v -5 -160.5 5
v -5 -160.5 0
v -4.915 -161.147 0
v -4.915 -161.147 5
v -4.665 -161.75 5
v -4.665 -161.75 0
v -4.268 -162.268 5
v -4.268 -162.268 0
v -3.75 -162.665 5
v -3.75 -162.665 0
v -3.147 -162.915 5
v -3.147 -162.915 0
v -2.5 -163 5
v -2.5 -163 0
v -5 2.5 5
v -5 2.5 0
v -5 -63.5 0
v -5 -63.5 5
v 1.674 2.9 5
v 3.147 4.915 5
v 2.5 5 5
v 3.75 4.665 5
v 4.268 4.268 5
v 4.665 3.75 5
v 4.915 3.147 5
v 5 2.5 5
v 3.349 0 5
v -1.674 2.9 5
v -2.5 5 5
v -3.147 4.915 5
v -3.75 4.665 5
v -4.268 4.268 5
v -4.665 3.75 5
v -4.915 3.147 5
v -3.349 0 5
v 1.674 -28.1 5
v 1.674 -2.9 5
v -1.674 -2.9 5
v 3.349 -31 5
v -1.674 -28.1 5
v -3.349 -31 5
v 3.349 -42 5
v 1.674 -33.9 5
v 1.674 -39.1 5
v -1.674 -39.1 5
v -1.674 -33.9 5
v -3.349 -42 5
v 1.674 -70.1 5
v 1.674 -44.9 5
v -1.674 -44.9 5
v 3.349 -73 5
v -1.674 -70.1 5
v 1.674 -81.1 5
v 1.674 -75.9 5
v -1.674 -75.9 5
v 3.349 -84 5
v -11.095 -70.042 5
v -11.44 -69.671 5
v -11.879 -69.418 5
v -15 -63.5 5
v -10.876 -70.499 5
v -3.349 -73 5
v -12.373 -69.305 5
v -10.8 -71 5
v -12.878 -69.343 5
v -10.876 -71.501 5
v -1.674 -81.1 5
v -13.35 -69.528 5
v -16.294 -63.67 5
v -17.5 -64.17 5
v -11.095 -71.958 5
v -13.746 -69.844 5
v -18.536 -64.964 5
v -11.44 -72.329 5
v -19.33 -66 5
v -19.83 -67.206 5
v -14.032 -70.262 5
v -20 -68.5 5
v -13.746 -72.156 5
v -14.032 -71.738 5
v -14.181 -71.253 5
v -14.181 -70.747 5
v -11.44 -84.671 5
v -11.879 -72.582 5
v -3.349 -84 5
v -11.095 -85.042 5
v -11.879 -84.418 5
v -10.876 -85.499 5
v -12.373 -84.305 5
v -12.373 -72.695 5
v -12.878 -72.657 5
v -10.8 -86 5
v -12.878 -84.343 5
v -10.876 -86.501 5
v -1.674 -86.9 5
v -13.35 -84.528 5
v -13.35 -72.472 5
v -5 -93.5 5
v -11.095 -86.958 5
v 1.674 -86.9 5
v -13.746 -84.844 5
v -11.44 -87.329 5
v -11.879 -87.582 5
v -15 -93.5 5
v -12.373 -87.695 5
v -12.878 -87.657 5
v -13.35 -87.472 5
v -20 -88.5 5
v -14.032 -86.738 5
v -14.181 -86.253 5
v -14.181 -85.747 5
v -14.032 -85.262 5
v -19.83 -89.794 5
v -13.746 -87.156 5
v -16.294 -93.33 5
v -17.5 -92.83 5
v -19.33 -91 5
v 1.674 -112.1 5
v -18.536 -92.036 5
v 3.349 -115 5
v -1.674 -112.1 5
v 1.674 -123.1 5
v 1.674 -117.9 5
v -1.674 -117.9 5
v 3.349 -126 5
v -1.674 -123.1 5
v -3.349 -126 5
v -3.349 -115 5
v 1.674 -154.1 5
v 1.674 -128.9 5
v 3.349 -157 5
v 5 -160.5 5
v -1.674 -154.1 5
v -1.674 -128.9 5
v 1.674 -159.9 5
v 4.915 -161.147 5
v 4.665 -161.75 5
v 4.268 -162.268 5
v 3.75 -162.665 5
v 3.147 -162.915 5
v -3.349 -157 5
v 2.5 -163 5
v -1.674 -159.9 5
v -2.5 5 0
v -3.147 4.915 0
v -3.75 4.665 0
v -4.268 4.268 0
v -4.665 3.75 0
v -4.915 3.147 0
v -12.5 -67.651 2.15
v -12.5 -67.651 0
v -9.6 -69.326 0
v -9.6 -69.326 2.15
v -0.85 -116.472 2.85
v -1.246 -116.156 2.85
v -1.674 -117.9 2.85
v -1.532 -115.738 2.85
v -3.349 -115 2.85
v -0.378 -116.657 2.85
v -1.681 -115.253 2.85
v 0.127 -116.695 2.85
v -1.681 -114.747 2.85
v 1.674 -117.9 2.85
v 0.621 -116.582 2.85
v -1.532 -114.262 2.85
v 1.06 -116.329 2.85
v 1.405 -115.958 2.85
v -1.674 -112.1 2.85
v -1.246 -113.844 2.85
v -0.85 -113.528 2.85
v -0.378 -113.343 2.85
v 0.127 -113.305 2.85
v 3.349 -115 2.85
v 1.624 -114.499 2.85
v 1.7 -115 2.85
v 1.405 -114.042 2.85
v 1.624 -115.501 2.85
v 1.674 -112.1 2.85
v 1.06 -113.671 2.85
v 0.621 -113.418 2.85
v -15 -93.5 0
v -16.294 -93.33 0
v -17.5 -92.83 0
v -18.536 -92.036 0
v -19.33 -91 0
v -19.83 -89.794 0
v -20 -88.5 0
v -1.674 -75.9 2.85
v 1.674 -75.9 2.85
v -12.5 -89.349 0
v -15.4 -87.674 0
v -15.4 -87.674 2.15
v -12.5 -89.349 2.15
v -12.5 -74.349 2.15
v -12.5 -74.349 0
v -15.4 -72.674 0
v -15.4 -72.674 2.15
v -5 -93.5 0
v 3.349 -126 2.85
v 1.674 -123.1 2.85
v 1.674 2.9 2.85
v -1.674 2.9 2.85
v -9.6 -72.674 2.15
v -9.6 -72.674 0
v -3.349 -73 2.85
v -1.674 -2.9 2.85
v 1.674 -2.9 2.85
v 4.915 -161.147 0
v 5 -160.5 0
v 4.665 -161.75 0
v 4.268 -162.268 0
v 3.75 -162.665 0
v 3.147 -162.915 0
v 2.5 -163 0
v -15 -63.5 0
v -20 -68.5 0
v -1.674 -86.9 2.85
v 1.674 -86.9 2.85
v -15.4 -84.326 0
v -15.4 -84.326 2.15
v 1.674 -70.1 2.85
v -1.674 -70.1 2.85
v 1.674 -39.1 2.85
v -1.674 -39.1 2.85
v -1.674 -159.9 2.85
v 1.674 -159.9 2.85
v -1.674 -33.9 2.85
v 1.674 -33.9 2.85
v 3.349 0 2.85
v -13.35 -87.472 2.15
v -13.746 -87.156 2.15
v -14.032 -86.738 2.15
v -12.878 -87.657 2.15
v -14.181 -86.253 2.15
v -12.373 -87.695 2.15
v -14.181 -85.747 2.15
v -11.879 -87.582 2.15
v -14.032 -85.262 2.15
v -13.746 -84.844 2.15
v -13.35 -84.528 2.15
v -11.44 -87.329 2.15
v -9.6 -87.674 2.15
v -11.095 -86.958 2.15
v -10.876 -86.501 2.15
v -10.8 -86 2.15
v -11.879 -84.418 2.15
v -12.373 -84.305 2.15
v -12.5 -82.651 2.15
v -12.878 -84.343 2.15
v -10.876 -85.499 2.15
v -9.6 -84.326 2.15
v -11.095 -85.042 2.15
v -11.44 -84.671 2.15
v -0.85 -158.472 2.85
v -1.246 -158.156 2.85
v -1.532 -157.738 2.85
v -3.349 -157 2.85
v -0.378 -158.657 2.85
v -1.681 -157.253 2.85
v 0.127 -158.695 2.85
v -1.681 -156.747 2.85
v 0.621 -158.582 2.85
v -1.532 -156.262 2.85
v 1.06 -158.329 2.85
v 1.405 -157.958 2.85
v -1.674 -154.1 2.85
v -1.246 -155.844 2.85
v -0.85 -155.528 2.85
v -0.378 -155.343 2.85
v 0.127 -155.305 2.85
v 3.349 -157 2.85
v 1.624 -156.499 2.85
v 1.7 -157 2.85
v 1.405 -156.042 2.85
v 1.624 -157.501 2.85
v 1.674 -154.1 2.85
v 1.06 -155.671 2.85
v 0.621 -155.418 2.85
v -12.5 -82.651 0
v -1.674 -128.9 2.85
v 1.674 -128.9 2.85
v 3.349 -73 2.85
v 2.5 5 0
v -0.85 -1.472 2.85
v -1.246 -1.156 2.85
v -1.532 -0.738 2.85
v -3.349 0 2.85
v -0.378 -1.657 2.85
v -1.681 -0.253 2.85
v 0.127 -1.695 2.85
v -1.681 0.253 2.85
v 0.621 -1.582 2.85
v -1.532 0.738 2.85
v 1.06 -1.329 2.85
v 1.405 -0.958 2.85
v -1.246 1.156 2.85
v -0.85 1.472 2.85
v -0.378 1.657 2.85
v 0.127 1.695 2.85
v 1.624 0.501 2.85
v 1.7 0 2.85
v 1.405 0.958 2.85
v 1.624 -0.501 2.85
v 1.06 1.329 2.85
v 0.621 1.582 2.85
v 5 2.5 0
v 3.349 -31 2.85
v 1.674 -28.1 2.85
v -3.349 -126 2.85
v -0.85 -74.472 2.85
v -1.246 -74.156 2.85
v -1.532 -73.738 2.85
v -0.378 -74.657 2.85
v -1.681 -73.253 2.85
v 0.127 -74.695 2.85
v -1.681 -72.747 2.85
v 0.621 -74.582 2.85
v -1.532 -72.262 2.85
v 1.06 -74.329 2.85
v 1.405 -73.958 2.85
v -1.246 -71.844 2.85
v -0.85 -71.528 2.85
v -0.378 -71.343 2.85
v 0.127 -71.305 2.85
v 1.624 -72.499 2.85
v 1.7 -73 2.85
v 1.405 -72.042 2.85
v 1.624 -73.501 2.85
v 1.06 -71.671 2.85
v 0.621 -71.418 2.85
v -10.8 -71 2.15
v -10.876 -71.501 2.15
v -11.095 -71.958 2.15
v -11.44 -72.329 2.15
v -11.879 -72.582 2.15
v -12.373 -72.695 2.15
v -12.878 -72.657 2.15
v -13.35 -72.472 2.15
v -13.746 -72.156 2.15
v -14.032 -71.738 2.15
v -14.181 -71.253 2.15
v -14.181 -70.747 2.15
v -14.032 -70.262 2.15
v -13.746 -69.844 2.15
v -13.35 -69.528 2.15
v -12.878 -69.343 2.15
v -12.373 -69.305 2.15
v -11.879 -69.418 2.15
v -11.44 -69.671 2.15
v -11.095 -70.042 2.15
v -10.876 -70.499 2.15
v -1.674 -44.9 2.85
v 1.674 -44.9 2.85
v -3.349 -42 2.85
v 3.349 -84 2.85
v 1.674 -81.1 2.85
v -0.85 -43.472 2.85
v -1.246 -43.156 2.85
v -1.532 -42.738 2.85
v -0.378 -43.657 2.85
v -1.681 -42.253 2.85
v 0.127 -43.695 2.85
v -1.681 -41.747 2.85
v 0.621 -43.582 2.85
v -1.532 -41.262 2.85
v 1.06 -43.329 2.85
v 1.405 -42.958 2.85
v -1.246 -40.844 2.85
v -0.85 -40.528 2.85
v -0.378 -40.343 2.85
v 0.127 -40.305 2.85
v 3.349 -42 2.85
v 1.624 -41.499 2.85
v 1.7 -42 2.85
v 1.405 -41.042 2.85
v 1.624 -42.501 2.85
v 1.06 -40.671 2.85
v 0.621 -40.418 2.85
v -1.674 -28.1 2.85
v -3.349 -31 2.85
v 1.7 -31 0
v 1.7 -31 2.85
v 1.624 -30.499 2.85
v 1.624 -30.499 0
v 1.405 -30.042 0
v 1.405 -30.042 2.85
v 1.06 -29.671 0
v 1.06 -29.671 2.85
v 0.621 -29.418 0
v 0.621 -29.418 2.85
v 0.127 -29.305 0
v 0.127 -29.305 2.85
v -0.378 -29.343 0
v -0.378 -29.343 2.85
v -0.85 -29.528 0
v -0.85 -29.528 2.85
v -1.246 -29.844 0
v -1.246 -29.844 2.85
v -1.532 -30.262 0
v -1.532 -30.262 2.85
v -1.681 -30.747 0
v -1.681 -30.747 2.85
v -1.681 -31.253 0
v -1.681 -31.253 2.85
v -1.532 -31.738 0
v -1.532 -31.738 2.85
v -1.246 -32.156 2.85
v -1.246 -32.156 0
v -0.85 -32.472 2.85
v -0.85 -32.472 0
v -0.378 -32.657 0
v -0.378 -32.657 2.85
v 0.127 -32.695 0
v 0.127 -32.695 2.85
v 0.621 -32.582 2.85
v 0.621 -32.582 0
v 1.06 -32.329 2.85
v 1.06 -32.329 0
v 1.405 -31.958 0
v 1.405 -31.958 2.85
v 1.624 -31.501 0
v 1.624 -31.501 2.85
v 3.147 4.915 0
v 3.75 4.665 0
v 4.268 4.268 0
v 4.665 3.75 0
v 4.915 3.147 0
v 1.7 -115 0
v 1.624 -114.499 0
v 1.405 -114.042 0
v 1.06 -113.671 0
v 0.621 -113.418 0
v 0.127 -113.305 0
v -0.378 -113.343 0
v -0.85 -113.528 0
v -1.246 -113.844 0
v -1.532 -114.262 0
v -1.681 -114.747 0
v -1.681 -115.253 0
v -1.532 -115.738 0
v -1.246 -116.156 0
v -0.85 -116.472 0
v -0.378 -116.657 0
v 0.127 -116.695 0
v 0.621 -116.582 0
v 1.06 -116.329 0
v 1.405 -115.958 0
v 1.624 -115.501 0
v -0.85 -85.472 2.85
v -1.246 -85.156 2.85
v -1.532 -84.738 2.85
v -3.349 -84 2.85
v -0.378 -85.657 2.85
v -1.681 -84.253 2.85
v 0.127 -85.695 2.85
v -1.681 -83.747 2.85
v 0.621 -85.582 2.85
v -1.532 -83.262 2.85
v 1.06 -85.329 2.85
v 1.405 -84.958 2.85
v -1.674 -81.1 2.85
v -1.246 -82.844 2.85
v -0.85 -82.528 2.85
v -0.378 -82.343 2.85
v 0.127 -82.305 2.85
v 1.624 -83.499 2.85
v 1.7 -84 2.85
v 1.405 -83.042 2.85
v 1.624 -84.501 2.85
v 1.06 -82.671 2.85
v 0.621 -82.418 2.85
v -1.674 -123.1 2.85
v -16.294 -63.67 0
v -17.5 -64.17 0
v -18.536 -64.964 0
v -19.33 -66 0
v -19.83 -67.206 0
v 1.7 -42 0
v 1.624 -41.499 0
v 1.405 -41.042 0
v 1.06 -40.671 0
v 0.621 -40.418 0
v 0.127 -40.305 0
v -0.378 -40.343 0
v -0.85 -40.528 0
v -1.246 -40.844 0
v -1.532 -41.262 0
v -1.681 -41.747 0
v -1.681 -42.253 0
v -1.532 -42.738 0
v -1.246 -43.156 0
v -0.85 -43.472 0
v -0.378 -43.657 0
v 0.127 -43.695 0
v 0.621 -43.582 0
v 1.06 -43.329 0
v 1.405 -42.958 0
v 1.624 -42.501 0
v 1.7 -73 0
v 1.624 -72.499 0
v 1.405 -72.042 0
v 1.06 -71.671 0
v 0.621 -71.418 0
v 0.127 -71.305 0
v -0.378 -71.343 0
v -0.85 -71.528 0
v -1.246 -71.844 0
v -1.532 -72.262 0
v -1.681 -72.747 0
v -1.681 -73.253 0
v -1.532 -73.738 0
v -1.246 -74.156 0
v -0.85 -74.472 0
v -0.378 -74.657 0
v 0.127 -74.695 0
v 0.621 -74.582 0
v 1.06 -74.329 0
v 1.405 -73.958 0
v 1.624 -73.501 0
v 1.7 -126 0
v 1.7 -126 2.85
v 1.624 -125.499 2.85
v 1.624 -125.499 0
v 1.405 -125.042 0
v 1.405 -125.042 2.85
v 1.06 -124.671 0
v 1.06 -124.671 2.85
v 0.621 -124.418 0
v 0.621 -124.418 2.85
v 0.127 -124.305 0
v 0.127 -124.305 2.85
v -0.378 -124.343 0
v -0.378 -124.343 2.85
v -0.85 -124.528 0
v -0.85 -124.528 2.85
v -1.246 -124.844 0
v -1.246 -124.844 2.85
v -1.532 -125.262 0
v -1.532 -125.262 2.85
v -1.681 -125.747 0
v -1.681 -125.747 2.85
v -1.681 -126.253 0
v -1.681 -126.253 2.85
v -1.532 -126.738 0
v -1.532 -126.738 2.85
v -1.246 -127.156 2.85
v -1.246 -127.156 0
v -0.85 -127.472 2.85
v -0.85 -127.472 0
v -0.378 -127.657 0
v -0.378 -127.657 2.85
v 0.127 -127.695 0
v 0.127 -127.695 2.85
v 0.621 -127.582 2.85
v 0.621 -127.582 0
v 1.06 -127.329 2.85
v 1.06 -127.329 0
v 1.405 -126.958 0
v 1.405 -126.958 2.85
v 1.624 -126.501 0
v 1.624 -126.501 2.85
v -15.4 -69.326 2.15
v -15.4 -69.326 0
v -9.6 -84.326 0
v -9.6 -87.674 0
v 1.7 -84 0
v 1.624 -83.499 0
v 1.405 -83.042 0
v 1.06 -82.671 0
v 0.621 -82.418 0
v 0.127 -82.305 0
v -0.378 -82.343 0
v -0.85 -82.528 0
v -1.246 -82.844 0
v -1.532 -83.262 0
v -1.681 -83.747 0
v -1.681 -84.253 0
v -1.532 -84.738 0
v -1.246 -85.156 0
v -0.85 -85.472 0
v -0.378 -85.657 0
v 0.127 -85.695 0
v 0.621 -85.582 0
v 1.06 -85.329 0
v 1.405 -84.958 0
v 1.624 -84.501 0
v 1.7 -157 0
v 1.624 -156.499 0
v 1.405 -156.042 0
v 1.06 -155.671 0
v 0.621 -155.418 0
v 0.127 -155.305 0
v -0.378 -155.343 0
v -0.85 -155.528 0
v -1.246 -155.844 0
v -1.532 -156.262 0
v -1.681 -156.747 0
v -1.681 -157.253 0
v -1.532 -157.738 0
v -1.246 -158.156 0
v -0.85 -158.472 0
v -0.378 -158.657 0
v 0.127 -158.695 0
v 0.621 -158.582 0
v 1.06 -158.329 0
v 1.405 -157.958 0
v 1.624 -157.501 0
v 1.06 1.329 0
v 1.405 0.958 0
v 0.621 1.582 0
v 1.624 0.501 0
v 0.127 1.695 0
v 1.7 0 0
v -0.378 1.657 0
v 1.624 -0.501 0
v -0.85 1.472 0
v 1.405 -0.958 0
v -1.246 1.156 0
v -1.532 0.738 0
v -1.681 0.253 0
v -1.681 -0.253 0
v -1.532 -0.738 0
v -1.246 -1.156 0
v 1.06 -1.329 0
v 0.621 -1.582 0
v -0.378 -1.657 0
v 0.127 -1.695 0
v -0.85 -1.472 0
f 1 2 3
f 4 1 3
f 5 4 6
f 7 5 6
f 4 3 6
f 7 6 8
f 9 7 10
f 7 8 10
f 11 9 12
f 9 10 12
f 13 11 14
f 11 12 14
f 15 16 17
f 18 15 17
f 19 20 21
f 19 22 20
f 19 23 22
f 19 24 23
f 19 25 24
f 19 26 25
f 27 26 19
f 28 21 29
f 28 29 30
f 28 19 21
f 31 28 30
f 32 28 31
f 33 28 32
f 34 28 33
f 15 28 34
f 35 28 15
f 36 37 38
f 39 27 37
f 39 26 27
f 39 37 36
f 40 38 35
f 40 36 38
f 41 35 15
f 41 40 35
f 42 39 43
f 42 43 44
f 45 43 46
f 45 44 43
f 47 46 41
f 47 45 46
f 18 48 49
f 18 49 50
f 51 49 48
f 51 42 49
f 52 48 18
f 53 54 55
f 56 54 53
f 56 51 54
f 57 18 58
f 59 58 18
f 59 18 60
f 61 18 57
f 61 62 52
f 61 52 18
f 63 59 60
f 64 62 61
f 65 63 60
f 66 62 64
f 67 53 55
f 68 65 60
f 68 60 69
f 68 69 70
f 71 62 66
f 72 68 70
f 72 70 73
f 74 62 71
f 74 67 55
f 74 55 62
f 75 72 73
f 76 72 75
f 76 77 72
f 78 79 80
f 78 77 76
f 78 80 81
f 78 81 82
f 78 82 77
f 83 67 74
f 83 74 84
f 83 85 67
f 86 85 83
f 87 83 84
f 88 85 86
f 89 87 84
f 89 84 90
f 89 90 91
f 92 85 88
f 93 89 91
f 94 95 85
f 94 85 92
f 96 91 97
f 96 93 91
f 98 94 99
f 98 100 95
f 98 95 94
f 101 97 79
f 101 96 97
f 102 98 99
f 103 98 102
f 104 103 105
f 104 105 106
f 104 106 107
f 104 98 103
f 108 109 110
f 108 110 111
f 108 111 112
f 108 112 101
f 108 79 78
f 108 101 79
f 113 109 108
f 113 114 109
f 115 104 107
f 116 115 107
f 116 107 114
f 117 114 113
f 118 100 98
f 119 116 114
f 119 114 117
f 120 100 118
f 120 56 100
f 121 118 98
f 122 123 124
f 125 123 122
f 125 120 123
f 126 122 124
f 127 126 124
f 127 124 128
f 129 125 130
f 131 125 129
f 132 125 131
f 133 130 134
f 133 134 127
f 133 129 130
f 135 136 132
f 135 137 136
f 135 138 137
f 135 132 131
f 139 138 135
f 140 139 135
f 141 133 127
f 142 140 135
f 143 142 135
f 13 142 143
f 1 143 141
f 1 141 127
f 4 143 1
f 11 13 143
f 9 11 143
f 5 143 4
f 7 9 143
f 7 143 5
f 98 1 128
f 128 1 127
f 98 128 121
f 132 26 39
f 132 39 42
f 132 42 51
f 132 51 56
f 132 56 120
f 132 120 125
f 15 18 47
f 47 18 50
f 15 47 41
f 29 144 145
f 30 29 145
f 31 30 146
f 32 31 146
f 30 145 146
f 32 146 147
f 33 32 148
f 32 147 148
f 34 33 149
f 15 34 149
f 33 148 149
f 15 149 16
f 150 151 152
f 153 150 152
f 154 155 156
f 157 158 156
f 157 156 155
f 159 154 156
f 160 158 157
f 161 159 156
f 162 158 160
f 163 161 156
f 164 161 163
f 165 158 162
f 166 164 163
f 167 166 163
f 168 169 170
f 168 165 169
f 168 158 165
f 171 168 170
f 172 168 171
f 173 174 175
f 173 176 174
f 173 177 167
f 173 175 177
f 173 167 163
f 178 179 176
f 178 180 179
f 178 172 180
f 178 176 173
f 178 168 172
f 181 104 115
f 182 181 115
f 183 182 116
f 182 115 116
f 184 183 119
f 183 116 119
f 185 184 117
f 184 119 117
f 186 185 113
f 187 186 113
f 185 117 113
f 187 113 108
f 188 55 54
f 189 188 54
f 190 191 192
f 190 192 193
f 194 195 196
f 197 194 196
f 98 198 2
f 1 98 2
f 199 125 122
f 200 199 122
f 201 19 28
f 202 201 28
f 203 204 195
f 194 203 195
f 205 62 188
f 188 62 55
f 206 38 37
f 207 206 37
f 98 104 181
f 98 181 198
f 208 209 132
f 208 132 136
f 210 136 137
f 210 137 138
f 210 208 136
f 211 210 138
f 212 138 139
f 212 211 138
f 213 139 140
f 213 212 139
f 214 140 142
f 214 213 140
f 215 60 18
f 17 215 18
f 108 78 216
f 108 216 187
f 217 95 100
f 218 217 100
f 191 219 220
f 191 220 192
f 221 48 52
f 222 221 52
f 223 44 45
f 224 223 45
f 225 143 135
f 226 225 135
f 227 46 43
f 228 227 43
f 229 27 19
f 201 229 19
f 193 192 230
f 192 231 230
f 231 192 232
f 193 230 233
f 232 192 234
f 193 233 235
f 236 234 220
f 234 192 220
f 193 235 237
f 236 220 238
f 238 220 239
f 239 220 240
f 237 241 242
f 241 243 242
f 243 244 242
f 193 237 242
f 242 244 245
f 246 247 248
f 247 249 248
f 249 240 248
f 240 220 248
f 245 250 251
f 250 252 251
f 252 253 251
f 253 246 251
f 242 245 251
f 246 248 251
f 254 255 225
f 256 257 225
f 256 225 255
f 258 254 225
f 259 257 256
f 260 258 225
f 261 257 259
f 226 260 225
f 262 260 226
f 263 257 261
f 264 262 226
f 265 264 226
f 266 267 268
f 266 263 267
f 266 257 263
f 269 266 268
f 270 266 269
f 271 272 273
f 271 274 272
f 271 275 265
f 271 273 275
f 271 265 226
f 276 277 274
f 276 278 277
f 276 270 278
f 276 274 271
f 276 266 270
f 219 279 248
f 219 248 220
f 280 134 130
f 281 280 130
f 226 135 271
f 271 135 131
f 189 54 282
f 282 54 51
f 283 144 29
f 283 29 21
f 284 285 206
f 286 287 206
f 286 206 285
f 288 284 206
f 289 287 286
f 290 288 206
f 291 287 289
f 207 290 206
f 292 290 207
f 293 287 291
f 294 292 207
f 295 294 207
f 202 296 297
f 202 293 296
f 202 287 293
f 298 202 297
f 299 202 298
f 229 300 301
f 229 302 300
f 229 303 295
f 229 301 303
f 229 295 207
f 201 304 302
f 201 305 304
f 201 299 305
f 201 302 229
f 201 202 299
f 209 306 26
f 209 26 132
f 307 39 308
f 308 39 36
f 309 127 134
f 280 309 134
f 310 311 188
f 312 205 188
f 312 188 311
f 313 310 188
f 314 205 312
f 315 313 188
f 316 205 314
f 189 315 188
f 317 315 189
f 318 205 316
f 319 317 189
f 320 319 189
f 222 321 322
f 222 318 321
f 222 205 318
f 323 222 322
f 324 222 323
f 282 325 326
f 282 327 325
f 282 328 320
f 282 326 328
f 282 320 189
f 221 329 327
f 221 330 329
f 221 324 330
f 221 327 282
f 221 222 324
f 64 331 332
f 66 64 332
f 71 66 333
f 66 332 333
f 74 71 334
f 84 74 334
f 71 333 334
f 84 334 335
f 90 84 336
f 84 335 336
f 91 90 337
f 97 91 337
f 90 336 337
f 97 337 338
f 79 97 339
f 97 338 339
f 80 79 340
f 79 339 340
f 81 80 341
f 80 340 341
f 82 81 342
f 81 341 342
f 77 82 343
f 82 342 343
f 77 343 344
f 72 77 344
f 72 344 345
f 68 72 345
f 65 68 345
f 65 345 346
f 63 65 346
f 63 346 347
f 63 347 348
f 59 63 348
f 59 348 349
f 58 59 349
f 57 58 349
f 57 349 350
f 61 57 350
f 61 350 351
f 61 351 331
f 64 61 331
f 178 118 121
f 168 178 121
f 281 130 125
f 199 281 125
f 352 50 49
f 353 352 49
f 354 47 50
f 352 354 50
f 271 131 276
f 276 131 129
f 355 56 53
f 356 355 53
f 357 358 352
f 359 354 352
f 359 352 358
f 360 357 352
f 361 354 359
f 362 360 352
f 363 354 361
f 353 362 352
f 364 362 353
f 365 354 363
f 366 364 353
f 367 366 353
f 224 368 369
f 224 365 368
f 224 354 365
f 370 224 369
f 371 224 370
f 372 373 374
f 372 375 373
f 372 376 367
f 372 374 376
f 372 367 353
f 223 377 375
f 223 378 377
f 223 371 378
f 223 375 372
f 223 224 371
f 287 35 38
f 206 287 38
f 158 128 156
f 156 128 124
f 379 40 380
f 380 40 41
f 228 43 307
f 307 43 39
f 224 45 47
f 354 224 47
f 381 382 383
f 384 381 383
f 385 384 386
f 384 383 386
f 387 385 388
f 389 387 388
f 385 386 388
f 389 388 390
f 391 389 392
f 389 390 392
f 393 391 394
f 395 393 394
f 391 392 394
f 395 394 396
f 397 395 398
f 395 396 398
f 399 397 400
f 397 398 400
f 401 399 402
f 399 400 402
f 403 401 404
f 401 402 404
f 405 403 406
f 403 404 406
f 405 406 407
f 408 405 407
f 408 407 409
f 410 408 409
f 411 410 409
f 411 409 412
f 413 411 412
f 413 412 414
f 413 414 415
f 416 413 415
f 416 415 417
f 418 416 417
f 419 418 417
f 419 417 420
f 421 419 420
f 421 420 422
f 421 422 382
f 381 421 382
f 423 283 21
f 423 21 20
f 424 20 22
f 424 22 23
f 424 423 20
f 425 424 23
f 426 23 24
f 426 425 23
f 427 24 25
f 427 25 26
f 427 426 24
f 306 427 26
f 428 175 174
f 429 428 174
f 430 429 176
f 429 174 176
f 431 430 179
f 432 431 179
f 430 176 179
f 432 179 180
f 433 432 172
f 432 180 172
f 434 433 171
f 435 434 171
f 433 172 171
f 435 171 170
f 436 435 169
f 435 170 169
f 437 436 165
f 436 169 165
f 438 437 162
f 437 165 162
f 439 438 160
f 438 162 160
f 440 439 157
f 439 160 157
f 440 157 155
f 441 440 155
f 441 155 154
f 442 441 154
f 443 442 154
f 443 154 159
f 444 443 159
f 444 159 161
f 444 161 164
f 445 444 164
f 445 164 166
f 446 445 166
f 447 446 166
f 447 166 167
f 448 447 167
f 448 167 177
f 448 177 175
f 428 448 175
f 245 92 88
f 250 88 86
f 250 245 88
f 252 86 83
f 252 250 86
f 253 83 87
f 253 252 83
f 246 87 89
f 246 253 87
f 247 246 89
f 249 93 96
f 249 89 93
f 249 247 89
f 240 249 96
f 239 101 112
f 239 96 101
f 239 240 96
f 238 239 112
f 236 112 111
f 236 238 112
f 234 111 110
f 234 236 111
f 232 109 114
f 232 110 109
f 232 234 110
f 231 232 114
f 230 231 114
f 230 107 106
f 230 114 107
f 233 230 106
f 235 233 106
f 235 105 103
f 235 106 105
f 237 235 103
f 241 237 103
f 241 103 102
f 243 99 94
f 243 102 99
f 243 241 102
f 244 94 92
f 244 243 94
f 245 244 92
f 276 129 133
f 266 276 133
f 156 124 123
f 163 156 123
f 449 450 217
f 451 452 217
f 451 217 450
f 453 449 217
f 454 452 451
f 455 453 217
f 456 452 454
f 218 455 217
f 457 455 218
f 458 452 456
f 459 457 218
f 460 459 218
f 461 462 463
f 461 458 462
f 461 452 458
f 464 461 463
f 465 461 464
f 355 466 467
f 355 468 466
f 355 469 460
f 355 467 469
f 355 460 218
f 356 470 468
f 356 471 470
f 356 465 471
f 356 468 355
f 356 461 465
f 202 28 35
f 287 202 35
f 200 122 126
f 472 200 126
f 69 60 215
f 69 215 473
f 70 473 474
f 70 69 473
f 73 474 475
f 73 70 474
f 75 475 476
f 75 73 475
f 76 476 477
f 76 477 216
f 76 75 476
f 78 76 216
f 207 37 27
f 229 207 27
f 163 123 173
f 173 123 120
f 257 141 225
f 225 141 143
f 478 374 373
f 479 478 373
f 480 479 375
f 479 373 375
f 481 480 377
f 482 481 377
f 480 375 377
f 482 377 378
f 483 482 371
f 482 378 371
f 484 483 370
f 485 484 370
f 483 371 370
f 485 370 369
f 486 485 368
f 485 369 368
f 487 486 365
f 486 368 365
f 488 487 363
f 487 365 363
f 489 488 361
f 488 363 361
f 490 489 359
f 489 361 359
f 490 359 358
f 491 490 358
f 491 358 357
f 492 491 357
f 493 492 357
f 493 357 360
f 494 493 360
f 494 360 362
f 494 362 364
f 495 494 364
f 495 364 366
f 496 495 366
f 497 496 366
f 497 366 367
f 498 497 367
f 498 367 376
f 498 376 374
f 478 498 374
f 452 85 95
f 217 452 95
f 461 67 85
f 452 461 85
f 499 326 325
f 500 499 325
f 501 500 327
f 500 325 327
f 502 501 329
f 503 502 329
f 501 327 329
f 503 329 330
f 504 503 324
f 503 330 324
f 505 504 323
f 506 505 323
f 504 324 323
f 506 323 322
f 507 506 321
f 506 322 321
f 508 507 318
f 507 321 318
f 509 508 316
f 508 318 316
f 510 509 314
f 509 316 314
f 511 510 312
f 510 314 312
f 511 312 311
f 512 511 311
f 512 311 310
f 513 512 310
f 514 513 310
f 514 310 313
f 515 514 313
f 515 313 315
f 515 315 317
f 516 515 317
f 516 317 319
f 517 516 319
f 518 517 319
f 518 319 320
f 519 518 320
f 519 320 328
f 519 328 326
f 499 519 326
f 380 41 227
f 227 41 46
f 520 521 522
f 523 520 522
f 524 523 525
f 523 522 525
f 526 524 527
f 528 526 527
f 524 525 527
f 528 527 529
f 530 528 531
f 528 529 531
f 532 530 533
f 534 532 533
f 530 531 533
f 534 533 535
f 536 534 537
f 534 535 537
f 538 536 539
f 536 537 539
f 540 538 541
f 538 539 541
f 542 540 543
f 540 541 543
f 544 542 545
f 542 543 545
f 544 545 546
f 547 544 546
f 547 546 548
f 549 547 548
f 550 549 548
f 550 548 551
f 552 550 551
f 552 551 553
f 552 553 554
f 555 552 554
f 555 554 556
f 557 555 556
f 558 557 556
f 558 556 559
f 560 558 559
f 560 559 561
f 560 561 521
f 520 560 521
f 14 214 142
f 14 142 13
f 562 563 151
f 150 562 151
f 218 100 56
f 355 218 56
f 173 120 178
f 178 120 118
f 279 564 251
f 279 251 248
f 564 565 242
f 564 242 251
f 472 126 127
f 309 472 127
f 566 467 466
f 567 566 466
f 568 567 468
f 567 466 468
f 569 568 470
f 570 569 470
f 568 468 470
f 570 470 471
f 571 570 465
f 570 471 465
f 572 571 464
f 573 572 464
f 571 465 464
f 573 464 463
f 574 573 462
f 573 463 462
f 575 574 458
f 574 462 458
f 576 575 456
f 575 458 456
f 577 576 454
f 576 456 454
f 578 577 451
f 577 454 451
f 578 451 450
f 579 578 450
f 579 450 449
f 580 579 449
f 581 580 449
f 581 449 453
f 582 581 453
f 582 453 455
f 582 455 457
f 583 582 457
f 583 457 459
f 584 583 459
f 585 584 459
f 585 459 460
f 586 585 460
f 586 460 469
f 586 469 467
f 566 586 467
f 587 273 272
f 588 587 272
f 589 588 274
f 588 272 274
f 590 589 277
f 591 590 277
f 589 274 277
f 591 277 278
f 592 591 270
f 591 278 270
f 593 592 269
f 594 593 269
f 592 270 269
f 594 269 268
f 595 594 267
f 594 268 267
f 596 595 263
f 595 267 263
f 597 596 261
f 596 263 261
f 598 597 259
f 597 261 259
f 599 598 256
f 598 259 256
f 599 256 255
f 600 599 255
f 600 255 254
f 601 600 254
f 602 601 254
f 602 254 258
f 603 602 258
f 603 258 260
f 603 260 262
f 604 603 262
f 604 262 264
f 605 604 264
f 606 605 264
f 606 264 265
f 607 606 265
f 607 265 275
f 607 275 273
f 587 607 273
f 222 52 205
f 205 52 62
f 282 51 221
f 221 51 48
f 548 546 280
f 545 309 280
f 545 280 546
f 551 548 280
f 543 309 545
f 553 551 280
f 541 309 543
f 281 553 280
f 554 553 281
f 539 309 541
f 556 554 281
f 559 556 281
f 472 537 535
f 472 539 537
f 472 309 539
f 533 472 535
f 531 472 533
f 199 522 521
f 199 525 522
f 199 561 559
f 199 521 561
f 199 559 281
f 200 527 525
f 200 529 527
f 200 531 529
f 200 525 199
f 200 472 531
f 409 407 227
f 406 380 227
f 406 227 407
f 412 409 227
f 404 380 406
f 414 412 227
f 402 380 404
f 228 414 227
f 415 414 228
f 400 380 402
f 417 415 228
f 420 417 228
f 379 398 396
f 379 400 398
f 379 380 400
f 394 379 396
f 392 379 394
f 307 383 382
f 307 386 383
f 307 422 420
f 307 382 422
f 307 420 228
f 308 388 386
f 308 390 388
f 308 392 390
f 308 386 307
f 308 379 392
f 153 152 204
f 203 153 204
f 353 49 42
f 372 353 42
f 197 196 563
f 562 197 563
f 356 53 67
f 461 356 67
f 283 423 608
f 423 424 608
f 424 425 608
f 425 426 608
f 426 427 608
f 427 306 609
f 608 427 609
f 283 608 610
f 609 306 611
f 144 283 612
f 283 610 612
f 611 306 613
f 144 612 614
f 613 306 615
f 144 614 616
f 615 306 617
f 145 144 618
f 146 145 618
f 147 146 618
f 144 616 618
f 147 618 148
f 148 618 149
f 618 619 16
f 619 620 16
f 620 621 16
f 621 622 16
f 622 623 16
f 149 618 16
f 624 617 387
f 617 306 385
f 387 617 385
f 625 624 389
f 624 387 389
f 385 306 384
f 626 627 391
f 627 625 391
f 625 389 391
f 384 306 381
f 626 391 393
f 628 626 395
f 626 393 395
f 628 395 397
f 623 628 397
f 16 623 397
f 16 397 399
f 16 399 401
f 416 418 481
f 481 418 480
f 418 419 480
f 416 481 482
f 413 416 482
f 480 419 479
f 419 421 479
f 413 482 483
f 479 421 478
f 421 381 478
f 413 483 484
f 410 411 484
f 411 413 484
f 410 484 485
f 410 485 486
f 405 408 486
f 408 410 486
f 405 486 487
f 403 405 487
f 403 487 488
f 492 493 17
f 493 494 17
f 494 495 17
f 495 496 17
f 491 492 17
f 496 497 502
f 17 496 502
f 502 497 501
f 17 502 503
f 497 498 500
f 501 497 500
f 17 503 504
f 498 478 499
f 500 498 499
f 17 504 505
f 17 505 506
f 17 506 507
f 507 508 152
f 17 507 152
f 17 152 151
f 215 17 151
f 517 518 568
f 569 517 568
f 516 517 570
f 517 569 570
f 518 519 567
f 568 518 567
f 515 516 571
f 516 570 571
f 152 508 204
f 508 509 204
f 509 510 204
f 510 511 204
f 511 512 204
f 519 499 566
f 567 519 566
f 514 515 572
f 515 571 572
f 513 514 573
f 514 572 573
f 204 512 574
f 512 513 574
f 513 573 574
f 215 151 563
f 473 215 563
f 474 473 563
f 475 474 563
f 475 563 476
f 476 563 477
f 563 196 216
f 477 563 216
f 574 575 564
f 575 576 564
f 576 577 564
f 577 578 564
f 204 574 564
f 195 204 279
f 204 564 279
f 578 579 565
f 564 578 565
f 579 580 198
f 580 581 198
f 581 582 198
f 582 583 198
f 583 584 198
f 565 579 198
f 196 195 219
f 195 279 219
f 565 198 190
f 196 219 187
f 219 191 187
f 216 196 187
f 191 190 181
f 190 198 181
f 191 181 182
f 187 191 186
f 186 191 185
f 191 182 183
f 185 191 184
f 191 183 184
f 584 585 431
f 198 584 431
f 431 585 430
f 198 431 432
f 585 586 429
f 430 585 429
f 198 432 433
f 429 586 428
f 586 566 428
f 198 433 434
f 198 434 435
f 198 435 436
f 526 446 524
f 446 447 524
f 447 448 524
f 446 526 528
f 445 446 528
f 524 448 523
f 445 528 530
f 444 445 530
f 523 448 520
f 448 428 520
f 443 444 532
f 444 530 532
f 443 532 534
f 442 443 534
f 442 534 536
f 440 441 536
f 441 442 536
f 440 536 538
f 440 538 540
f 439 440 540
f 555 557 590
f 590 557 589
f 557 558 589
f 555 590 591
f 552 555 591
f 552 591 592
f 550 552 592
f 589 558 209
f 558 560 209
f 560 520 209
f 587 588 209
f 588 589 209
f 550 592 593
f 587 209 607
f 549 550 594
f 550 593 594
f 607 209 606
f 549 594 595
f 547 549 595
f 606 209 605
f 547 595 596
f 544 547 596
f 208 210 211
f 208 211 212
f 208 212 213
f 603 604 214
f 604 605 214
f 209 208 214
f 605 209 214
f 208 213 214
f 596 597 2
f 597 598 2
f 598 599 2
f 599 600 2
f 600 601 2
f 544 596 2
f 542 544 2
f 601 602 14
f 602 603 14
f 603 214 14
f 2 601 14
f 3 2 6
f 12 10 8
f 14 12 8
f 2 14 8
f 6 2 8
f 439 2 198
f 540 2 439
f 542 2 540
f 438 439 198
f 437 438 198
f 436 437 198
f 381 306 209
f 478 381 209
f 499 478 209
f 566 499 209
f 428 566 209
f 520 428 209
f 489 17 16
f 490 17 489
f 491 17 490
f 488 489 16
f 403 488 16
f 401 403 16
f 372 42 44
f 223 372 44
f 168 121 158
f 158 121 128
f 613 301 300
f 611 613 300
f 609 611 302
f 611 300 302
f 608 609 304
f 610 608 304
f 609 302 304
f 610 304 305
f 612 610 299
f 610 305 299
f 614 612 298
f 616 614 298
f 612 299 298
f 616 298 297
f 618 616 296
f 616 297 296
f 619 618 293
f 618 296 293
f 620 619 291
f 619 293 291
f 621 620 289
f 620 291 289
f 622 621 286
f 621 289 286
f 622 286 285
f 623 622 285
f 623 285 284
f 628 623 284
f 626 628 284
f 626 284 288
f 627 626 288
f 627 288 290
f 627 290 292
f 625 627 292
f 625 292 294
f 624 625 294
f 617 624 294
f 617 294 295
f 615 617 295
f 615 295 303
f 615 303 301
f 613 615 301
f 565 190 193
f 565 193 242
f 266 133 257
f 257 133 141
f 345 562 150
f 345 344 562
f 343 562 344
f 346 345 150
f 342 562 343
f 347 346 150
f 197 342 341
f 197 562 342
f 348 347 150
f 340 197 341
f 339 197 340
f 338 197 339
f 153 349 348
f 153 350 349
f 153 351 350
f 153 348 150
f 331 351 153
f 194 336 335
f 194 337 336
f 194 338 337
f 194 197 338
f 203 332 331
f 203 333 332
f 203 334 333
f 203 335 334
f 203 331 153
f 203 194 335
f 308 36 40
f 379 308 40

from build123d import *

# Parameters (mm, degrees)
PAD_DEPTH                    = 5
POCKET_DEPTH                 = 2.15
SKETCH002_R                  = 1.7
HOLE_DEPTH                   = 339.594226
POCKET_LINEARPATTERN_2_DEPTH = 2.15
SKETCH002_LINEARPATTERN_2_R  = 1.7
HOLE_LINEARPATTERN_2_DEPTH   = 339.594226
LINEARPATTERN001_COUNT       = 4
LINEARPATTERN001_PITCH       = 42
PAD001_DEPTH                 = 5
POCKET001_DEPTH              = 2.15
SKETCH005_R                  = 1.7
HOLE001_DEPTH                = 342.698024


with BuildPart() as part:
    # Sketch → Pad (new body)
    with BuildSketch(Plane.XY):
        with BuildLine():
            Line((0, 5), (-2.5, 5))
            ThreePointArc((-2.5, 5), (-4.267767, 4.267767), (-5, 2.5))
            Line((-5, 2.5), (-5, -160.5))
            ThreePointArc((-5, -160.5), (-4.267767, -162.267767), (-2.5, -163))
            Line((-2.5, -163), (0, -163))
            Line((0, -163), (0, 5))
        make_face()
    pad = extrude(amount=PAD_DEPTH)

    # Mirrored: Pad across Sketch V_Axis
    add(pad.mirror(Plane(origin=(0, 0, 0), x_dir=(0, 0, 1), z_dir=(1, 0, 0))))

    # Sketch001 (on Face5 of Mirrored) → Pocket (cut)
    with BuildSketch(Plane.XY.offset(5)):
        Polygon((3.348632, 0), (1.674316, 2.9), (-1.674316, 2.9), (-3.348632, 0), (-1.674316, -2.9), (1.674316, -2.9), align=None)
    pocket = extrude(amount=-POCKET_DEPTH, mode=Mode.SUBTRACT)

    # Sketch002 (on Face21 of Pocket) → Hole (cut, through all)
    with BuildSketch(Plane.XY.offset(2.85)):
        Circle(SKETCH002_R)
    hole = extrude(amount=-HOLE_DEPTH, mode=Mode.SUBTRACT)

    # Sketch001 LinearPattern 2 → Pocket LinearPattern 2 (cut)
    with BuildSketch(Plane(origin=(0, -31, 5), x_dir=(1, 0, 0), z_dir=(0, 0, 1))):
        Polygon((3.348632, 0), (1.674316, 2.9), (-1.674316, 2.9), (-3.348632, 0), (-1.674316, -2.9), (1.674316, -2.9), align=None)
    pocket_linearpattern_2 = extrude(amount=-POCKET_LINEARPATTERN_2_DEPTH, mode=Mode.SUBTRACT)

    # Sketch002 LinearPattern 2 → Hole LinearPattern 2 (cut, through all)
    with BuildSketch(Plane(origin=(0, -31, 2.85), x_dir=(1, 0, 0), z_dir=(0, 0, 1))):
        Circle(SKETCH002_LINEARPATTERN_2_R)
    hole_linearpattern_2 = extrude(amount=-HOLE_LINEARPATTERN_2_DEPTH, mode=Mode.SUBTRACT)

    # LinearPattern001: Pocket, Hole, Pocket LinearPattern 2, Hole LinearPattern 2 ×4
    with Locations(*[(0, -i * LINEARPATTERN001_PITCH, 0) for i in range(1, LINEARPATTERN001_COUNT)]):
        add(pocket, mode=Mode.SUBTRACT)
        add(hole, mode=Mode.SUBTRACT)
        add(pocket_linearpattern_2, mode=Mode.SUBTRACT)
        add(hole_linearpattern_2, mode=Mode.SUBTRACT)

    # Sketch003 (on Face5 of MultiTransform) → Pad001 (join)
    with BuildSketch(Plane.XY.offset(5)):
        with BuildLine():
            Line((-5, -78.5), (-20, -78.5))
            Line((-20, -78.5), (-20, -68.5))
            ThreePointArc((-15, -63.5), (-18.535534, -64.964466), (-20, -68.5))
            Line((-15, -63.5), (-5, -63.5))
            Line((-5, -63.5), (-5, -78.5))
        make_face()
    pad001 = extrude(amount=-PAD001_DEPTH)

    # Sketch004 (on Face17 of Pad001) → Pocket001 (cut)
    with BuildSketch(Plane(origin=(0, 0, 0), x_dir=(1, 0, 0), z_dir=(0, 0, -1))):
        Polygon((-9.6, 72.674316), (-12.5, 74.348632), (-15.4, 72.674316), (-15.4, 69.325684), (-12.5, 67.651368), (-9.6, 69.325684), align=None)
    pocket001 = extrude(amount=-POCKET001_DEPTH, mode=Mode.SUBTRACT)

    # Sketch005 (on Face92 of Pocket001) → Hole001 (cut, through all)
    with BuildSketch(Plane(origin=(0, 0, 2.15), x_dir=(1, 0, 0), z_dir=(0, 0, -1))):
        with Locations((-12.5, 71)):
            Circle(SKETCH005_R)
    hole001 = extrude(amount=-HOLE001_DEPTH, mode=Mode.SUBTRACT)

    # Mirrored001: Pad001, Pocket001, Hole001 across face of Hole001
    add(pad001.mirror(Plane(origin=(-12.5, -78.5, 2.5), x_dir=(1, 0, 0), z_dir=(0, -1, 0))))
    add(pocket001.mirror(Plane(origin=(-12.5, -78.5, 2.5), x_dir=(1, 0, 0), z_dir=(0, -1, 0))), mode=Mode.SUBTRACT)
    add(hole001.mirror(Plane(origin=(-12.5, -78.5, 2.5), x_dir=(1, 0, 0), z_dir=(0, -1, 0))), mode=Mode.SUBTRACT)


solid = part.part
